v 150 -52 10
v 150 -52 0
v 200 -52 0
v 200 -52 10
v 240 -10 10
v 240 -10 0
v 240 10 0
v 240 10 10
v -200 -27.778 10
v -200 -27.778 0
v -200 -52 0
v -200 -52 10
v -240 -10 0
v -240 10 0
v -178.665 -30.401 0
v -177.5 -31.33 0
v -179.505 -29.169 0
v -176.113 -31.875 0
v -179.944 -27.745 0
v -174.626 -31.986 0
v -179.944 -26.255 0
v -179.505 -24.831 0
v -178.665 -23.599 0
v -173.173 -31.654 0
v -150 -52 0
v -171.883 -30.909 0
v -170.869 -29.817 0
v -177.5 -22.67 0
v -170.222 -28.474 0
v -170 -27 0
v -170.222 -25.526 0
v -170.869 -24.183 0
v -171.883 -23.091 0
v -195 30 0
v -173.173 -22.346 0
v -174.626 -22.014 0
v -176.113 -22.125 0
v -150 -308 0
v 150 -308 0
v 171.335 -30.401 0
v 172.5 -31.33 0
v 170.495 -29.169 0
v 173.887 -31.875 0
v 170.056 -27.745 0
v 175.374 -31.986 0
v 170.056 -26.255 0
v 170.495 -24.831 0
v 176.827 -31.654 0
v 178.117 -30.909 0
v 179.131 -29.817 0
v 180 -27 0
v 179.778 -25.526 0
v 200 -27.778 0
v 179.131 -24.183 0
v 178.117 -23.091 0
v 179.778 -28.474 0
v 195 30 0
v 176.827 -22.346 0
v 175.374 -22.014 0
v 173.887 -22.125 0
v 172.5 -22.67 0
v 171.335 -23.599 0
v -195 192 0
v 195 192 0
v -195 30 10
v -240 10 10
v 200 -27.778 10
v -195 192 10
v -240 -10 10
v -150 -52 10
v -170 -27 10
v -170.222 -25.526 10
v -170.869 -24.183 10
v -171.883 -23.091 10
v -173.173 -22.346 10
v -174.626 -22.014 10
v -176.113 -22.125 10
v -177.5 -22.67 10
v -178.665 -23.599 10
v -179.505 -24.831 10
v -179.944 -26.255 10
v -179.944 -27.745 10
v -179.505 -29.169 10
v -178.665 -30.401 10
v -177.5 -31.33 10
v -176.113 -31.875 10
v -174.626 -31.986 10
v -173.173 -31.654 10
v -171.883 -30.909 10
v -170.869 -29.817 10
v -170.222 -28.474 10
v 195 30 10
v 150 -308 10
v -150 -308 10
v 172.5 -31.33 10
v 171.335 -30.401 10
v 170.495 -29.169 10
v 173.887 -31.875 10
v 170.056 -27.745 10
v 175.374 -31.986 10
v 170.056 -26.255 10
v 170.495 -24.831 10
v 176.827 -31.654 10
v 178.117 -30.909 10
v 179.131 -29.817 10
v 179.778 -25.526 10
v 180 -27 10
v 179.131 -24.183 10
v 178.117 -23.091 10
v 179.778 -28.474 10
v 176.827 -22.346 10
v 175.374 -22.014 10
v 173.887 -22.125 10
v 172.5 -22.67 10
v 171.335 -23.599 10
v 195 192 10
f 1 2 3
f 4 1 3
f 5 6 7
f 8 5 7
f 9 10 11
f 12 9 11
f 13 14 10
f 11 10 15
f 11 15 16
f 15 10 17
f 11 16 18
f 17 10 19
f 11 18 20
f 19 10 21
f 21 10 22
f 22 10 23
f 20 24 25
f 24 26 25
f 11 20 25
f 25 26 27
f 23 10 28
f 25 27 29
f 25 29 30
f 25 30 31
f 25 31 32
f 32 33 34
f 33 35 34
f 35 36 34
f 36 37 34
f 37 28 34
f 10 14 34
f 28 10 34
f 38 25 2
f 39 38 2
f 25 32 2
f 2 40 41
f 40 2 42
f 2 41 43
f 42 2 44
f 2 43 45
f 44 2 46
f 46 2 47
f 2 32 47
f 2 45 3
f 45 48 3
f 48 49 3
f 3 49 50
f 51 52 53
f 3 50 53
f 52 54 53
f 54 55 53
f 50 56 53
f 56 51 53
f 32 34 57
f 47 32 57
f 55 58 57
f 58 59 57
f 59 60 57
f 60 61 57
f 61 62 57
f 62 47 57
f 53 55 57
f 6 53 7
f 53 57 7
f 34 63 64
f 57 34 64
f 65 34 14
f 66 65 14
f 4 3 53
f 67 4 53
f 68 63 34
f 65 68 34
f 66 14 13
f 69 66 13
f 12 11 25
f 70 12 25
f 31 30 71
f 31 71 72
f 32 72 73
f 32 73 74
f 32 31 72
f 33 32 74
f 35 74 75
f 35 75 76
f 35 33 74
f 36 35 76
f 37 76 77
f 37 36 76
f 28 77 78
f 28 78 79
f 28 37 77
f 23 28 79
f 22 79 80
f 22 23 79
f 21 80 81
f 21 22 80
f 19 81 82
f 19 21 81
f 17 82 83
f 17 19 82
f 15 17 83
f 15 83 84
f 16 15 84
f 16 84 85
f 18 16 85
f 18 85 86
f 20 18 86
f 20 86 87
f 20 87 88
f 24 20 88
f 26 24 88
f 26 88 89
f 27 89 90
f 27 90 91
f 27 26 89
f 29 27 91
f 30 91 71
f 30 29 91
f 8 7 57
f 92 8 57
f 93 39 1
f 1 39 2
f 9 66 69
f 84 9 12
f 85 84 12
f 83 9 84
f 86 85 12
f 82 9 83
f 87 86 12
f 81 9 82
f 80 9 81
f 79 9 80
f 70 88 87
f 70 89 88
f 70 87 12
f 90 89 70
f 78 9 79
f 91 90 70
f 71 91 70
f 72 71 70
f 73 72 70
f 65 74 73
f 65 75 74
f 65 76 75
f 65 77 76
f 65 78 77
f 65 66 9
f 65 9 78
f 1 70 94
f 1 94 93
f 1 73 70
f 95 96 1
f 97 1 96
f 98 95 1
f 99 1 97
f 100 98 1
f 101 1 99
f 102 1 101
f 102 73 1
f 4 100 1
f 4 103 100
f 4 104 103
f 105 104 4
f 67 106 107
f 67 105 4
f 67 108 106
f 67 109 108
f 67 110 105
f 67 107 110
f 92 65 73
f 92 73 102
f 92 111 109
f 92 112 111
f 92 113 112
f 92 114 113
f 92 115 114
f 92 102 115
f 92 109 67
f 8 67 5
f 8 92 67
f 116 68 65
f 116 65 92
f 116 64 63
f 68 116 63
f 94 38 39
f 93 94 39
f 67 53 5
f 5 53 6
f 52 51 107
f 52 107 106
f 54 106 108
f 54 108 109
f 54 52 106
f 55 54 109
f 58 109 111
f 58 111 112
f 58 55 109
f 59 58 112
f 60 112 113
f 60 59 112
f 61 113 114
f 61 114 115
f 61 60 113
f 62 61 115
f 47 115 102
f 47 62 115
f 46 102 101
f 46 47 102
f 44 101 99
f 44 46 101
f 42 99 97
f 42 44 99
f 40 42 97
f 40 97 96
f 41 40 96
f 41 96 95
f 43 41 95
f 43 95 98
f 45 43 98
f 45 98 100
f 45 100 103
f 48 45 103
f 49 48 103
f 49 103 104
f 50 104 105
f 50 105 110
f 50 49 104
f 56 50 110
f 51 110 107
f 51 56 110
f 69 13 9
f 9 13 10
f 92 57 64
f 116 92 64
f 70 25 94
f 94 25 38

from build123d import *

# Parameters (mm, degrees)
F0_R     = 5
F1_DEPTH = 10


with BuildPart() as f1:
    # F0 (on Top) → F1 (new body)
    with BuildSketch(Plane.XY):
        Polygon((-195, 30), (-240, 10), (-240, -10), (-200, -27.777778), (-200, -52), (-150, -52), (-150, -308), (0, -308), (150, -308), (150, -52), (200, -52), (200, -27.777778), (240, -10), (240, 10), (195, 30), (195, 192), (0, 192), (-195, 192), align=None)
        with Locations((-175, -27)):
            Circle(F0_R, mode=Mode.SUBTRACT)
        with Locations((175, -27)):
            Circle(F0_R, mode=Mode.SUBTRACT)
    extrude(amount=F1_DEPTH)


solid = f1.part
